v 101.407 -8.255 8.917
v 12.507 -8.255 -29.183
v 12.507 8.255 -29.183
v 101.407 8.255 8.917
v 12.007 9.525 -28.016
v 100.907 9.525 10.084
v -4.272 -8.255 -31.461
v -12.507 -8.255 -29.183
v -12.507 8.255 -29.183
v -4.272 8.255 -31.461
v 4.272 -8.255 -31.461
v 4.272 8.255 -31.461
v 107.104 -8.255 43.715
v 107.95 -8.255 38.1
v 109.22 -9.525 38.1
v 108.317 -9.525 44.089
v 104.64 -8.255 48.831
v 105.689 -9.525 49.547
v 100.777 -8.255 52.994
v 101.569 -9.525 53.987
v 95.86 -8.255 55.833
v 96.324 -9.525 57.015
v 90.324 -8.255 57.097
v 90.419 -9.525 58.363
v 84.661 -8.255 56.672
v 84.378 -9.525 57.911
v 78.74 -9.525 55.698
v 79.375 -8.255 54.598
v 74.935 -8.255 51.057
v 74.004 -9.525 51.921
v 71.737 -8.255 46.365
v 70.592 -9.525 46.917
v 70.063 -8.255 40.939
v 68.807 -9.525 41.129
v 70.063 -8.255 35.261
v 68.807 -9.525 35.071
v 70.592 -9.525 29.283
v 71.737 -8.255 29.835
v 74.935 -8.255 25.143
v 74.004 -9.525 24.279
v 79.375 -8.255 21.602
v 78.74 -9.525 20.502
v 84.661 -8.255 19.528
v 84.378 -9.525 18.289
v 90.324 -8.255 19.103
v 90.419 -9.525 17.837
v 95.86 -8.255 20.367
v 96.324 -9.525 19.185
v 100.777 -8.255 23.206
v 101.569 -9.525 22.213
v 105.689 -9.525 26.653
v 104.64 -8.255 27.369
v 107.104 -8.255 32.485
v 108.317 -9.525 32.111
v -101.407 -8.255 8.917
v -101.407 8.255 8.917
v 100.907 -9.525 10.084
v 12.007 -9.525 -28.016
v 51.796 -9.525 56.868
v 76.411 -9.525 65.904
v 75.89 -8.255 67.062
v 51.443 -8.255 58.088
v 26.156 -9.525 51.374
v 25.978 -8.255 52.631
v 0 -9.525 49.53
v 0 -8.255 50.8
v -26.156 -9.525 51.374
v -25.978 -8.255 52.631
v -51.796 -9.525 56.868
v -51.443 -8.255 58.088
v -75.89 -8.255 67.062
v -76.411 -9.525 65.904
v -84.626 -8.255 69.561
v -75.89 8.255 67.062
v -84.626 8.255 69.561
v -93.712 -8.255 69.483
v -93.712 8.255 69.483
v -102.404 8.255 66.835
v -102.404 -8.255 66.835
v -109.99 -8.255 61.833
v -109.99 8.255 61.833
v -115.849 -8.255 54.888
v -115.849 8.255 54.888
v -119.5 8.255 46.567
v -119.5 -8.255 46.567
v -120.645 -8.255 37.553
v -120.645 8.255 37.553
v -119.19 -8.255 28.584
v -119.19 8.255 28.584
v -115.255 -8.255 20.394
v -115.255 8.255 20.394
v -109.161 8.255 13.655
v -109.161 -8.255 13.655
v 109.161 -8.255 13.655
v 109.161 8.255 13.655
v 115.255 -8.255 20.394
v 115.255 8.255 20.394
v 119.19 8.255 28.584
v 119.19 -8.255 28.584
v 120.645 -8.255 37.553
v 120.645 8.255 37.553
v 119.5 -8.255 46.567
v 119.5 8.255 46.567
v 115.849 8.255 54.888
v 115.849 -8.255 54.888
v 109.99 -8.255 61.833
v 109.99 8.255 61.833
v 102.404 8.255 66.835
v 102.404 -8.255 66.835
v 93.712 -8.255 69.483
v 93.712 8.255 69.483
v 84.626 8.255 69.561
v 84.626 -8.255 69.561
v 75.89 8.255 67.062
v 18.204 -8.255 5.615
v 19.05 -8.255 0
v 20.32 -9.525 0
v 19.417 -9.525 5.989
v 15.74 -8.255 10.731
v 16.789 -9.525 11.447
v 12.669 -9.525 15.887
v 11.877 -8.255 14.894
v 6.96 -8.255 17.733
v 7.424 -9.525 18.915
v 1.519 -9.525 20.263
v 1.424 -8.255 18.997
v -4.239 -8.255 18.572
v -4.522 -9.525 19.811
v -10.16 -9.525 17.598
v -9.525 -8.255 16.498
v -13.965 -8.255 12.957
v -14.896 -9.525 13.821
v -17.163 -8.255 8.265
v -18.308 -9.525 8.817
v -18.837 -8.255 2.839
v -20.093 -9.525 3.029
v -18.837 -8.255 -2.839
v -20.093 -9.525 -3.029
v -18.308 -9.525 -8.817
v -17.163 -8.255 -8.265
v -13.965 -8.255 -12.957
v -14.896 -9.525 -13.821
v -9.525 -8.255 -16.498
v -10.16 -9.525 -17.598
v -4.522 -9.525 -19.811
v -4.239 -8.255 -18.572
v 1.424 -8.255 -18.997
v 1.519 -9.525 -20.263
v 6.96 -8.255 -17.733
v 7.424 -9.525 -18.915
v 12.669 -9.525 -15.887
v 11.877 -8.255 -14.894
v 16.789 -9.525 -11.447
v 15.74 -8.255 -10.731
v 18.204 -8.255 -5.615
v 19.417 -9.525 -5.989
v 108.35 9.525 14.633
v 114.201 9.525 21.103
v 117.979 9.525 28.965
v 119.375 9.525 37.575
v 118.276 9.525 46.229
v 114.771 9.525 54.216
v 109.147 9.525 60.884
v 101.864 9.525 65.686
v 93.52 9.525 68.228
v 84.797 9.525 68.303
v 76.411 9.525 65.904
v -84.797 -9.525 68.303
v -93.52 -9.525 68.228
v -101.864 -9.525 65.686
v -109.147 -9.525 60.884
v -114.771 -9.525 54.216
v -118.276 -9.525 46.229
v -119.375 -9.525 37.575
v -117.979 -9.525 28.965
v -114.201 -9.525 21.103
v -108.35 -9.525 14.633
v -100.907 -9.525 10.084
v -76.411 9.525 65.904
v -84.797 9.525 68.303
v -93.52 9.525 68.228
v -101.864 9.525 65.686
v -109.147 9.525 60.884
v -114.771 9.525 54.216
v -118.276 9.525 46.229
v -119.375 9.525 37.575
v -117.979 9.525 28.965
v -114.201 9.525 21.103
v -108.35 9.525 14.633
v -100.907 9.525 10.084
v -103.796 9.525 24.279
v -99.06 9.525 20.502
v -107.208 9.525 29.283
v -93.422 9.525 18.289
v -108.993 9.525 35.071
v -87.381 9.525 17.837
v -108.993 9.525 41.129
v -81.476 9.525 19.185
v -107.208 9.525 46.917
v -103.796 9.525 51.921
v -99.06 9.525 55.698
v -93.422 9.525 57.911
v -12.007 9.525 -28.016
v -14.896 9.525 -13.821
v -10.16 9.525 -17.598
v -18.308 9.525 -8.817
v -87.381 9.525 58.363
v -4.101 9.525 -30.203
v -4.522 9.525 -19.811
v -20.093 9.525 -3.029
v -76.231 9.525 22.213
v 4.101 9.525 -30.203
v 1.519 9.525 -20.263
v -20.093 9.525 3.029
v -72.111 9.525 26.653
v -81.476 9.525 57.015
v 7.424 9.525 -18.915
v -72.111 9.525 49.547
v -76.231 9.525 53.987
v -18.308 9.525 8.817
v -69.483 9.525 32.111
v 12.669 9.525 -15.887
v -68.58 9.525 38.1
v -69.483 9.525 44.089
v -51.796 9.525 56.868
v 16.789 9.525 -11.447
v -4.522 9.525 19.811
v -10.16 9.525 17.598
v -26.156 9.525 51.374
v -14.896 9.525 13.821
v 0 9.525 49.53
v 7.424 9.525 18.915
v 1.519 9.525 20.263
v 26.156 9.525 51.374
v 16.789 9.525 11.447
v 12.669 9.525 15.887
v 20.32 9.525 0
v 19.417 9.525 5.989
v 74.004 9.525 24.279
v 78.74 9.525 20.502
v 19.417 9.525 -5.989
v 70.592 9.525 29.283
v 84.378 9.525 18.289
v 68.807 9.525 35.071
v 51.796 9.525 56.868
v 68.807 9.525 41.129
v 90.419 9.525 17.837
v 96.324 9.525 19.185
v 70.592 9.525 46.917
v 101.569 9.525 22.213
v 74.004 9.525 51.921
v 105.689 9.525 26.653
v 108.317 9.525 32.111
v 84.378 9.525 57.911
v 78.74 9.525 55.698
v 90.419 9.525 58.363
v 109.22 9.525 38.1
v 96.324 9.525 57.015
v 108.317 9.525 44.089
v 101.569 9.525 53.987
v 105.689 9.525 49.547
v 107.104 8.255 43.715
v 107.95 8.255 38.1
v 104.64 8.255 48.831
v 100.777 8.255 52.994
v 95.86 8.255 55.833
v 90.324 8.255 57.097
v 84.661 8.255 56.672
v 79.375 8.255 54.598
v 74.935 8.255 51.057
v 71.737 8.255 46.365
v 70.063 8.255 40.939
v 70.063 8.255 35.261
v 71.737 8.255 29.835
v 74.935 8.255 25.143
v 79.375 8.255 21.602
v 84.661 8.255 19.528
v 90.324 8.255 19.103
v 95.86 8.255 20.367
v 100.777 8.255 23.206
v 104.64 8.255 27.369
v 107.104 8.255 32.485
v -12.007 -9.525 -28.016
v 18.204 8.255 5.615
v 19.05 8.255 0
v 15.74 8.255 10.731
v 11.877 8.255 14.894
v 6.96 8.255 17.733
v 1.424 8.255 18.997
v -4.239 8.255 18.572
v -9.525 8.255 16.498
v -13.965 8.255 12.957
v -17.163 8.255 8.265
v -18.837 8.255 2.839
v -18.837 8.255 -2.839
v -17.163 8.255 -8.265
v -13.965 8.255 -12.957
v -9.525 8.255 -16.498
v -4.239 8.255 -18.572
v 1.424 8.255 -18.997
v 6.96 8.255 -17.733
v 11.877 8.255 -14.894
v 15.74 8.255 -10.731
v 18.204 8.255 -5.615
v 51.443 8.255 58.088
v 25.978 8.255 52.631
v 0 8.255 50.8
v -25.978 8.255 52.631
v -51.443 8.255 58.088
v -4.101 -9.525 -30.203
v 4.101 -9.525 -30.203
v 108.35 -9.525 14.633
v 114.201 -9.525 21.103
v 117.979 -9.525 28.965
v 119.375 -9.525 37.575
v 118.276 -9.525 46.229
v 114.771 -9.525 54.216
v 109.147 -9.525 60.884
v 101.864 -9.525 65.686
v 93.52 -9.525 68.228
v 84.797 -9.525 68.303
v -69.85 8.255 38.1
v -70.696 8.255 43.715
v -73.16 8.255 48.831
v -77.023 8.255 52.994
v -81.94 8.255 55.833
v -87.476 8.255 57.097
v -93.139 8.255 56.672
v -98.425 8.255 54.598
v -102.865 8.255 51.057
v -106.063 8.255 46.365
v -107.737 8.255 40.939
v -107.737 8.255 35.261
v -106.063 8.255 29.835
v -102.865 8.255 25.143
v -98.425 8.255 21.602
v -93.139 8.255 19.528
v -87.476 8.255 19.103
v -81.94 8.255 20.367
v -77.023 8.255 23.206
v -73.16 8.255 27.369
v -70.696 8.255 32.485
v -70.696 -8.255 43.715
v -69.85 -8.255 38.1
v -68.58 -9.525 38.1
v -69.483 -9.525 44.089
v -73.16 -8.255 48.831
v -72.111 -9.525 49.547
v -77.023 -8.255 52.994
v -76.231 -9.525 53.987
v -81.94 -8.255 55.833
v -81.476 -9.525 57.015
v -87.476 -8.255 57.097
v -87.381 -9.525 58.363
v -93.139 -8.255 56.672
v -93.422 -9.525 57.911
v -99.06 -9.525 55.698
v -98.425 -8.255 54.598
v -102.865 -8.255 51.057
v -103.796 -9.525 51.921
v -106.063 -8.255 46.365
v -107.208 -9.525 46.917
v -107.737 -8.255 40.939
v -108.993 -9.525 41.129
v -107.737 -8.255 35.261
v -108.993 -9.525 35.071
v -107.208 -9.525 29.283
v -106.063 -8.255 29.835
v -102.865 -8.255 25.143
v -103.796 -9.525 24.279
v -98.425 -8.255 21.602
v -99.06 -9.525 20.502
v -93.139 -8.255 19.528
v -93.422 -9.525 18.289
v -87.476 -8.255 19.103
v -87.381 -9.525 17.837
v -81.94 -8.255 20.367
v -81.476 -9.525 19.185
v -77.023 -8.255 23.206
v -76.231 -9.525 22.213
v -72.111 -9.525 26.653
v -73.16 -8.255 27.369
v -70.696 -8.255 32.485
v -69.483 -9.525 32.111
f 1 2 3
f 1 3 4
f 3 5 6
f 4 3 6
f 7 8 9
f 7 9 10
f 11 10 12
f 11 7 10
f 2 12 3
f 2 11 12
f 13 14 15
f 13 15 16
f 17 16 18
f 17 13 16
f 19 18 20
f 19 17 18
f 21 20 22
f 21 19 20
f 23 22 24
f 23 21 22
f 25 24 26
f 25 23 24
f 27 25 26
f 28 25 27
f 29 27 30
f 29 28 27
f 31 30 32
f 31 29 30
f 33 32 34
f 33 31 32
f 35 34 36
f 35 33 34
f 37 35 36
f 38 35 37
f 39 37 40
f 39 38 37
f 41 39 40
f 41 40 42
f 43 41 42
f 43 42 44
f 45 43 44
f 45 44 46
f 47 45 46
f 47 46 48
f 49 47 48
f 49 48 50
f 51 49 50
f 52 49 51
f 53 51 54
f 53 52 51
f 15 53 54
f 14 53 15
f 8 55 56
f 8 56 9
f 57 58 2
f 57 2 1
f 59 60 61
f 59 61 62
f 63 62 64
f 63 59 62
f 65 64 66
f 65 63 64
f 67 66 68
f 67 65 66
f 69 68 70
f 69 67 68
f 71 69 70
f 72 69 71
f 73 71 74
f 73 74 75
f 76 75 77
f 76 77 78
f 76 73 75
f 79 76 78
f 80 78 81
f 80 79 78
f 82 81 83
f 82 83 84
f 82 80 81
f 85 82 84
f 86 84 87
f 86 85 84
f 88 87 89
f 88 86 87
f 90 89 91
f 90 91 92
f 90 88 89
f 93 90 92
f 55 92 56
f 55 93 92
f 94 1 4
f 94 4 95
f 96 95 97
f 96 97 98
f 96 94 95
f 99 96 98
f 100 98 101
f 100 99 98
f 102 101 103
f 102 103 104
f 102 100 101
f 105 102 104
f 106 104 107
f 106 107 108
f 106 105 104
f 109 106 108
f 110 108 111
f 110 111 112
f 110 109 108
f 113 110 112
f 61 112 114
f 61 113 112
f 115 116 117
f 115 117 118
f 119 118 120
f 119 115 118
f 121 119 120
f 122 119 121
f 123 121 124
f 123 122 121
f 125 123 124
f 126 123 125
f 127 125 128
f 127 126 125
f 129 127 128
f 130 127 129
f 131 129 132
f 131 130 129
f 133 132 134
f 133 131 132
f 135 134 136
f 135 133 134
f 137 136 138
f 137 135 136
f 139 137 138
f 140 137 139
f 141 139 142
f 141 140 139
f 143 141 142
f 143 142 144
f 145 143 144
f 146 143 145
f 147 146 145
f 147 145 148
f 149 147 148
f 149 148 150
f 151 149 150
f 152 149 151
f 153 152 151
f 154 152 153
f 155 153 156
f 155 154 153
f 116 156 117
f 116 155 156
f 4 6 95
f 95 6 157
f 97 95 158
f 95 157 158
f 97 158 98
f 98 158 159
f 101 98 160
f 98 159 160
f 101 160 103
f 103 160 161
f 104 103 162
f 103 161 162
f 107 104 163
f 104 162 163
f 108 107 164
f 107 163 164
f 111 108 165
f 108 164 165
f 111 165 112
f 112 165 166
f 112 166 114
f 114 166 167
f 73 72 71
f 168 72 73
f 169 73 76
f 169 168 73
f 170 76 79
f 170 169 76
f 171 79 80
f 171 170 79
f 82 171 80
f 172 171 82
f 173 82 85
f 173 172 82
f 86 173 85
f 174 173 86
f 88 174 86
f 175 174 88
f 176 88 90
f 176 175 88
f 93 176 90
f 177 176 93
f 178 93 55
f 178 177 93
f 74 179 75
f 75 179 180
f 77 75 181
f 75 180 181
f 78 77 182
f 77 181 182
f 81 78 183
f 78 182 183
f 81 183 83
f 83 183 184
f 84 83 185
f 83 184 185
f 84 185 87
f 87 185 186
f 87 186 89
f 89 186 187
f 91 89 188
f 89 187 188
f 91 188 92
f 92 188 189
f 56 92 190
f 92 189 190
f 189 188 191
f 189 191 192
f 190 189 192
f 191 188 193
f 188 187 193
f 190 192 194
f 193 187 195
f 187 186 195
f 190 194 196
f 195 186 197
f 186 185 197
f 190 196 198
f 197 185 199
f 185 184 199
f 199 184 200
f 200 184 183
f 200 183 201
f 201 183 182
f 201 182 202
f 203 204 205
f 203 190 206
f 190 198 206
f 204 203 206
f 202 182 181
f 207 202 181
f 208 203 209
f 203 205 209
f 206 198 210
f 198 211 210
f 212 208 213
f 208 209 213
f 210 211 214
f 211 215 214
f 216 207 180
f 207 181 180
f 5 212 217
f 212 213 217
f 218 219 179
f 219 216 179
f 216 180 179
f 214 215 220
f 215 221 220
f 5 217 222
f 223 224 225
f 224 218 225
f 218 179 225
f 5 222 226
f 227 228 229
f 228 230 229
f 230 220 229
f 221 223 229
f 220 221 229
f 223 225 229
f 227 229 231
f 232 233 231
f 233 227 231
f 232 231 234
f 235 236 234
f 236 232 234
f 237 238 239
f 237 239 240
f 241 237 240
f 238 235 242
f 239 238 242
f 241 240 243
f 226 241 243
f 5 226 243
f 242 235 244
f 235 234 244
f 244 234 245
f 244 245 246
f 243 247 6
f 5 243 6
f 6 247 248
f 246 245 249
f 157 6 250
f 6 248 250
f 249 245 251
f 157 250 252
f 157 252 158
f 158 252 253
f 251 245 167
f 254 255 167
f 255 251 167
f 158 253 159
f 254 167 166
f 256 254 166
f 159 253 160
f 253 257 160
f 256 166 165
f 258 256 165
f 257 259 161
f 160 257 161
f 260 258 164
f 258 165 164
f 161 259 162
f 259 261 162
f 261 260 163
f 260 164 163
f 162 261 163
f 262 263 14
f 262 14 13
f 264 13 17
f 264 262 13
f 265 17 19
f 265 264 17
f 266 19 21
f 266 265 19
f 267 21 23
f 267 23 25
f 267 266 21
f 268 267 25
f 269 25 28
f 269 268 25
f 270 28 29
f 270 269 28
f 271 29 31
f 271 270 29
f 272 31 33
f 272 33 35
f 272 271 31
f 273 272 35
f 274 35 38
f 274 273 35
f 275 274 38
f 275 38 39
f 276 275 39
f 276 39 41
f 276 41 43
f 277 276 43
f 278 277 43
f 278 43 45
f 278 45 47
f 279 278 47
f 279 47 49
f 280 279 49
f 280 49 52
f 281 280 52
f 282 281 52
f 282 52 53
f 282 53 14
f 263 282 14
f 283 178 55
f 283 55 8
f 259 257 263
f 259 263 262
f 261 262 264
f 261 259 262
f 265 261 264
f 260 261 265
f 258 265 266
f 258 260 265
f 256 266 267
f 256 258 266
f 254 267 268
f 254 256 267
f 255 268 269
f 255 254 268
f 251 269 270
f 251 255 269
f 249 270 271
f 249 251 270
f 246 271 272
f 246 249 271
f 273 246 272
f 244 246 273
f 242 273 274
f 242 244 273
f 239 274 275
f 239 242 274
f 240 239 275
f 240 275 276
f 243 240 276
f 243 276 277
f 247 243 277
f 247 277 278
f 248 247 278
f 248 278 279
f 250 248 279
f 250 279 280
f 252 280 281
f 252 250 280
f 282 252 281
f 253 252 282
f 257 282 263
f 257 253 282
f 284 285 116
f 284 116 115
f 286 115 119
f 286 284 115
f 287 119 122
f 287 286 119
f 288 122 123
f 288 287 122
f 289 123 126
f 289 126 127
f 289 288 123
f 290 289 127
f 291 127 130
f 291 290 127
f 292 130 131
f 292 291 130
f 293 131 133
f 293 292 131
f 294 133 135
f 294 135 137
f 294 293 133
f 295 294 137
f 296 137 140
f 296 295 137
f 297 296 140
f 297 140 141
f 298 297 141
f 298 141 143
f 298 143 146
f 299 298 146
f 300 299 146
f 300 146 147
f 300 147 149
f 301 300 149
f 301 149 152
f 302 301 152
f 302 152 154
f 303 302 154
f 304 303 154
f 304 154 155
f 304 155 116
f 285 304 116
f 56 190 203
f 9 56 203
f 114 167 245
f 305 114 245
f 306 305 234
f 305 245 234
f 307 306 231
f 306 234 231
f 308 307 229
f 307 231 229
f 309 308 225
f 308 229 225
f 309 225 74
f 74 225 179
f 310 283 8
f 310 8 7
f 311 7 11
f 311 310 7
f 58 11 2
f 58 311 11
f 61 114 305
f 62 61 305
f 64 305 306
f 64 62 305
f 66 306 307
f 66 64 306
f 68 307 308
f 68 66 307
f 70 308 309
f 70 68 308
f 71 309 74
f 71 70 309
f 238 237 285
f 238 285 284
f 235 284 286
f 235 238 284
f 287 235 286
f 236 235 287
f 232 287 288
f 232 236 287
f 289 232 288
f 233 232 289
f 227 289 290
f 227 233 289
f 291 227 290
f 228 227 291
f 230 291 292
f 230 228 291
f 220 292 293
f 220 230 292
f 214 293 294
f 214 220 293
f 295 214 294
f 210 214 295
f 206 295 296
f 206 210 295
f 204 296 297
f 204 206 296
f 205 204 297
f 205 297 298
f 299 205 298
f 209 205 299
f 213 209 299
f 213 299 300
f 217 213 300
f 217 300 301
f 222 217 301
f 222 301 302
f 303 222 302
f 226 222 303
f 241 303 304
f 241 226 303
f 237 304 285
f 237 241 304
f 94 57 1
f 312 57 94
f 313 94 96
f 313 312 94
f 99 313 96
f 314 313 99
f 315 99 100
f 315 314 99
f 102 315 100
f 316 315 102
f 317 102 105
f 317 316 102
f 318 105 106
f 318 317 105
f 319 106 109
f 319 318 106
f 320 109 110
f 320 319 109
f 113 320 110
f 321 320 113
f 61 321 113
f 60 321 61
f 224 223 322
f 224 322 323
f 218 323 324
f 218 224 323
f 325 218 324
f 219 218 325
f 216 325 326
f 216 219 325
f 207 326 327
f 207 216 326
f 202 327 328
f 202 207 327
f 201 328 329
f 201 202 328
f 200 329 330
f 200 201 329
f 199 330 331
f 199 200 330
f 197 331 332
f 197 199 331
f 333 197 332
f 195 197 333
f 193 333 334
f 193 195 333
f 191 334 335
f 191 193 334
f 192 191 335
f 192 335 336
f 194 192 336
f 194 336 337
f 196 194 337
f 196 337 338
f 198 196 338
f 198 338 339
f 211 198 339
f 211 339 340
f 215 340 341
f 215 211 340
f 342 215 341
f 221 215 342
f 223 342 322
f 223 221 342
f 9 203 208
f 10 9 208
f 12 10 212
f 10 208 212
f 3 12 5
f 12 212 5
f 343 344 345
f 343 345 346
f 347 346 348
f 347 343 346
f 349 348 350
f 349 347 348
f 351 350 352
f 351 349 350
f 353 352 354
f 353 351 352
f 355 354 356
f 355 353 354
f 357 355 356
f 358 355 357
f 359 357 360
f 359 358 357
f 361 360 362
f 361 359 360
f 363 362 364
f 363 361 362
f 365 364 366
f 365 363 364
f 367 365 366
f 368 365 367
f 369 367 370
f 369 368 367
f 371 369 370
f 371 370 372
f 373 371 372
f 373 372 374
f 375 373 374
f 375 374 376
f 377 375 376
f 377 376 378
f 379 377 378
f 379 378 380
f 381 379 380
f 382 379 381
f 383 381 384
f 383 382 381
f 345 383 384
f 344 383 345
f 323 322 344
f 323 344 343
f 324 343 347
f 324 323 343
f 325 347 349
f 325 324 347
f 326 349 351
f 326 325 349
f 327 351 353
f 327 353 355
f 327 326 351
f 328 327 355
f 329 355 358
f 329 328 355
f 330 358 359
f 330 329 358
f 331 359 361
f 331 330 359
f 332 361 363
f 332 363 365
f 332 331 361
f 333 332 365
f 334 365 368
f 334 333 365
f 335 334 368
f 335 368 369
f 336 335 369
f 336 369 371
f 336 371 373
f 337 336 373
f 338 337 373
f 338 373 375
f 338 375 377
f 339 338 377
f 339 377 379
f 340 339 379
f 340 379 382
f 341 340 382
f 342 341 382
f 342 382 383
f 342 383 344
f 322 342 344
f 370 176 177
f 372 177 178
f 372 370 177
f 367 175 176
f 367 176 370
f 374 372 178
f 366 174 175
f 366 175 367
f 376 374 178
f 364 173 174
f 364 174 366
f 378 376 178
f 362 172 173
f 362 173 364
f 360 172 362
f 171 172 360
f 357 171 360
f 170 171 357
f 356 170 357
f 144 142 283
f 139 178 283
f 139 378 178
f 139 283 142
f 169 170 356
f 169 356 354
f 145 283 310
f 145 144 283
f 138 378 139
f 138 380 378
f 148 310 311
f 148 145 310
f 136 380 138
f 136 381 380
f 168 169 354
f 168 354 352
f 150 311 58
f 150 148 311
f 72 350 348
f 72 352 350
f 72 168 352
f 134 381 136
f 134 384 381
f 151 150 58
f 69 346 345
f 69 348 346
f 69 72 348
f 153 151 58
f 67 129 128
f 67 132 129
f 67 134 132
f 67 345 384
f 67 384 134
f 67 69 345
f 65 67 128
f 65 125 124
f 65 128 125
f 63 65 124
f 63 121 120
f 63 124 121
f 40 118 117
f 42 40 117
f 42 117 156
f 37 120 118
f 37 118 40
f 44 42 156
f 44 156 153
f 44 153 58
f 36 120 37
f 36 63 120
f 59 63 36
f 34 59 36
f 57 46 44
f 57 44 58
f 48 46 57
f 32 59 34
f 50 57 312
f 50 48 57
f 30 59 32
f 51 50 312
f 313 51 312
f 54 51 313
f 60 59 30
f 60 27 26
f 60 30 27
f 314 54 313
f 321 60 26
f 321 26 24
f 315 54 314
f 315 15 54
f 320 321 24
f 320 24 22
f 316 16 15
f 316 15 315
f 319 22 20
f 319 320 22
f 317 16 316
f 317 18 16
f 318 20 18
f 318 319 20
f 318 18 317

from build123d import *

# Parameters (mm, degrees)
F0_R     = 19.05
F1_DEPTH = 9.525
F2_SIZE  = 1.27


# Not quite as in the source:
# - a feature names something its author has since deleted; it is built from what else it names


with BuildPart() as f1:
    # F0 (on Front) → F1 (new body, symmetric)
    with BuildSketch(Plane.XZ):
        with BuildLine():
            Line((-101.4069377299, 8.9171452969), (-12.5069377299, -29.1828547031))
            ThreePointArc((-12.5069377299, -29.1828547031), (0, -31.75), (12.5069377299, -29.1828547031))
            Line((12.5069377299, -29.1828547031), (101.4069377299, 8.9171452969))
            ThreePointArc((101.4069377299, 8.9171452969), (117.9736119422, 50.8588239518), (75.8902439024, 67.062195122))
            ThreePointArc((75.8902439024, 67.062195122), (0, 50.8), (-75.8902439024, 67.062195122))
            ThreePointArc((-75.8902439024, 67.062195122), (-117.9736119422, 50.8588239518), (-101.4069377299, 8.9171452969))
        make_face()
        Circle(F0_R, mode=Mode.SUBTRACT)
        with Locations((-88.9, 38.1)):
            Circle(F0_R, mode=Mode.SUBTRACT)
        with Locations((88.9, 38.1)):
            Circle(F0_R, mode=Mode.SUBTRACT)
    extrude(amount=F1_DEPTH, both=True)

    # F2
    f2_edges = [f1.edges().sort_by_distance(p)[0] for p in [
        (-117.973612, -9.525, 50.858824),
        (-56.956938, -9.525, -10.132855),
        (0, -9.525, -31.75),
        (56.956938, -9.525, -10.132855),
        (117.973612, -9.525, 50.858824),
        (0, -9.525, 50.8),
        (-56.956938, 9.525, -10.132855),
        (0, 9.525, -31.75),
        (56.956938, 9.525, -10.132855),
        (117.973612, 9.525, 50.858824),
        (0, 9.525, 50.8),
        (-117.973612, 9.525, 50.858824),
        (-19.05, 9.525, 0),
        (-107.95, 9.525, 38.1),
        (69.85, 9.525, 38.1),
        (-19.05, -9.525, 0),
        (-107.95, -9.525, 38.1),
        (69.85, -9.525, 38.1),
    ]]
    chamfer(f2_edges, length=F2_SIZE)


solid = f1.part
